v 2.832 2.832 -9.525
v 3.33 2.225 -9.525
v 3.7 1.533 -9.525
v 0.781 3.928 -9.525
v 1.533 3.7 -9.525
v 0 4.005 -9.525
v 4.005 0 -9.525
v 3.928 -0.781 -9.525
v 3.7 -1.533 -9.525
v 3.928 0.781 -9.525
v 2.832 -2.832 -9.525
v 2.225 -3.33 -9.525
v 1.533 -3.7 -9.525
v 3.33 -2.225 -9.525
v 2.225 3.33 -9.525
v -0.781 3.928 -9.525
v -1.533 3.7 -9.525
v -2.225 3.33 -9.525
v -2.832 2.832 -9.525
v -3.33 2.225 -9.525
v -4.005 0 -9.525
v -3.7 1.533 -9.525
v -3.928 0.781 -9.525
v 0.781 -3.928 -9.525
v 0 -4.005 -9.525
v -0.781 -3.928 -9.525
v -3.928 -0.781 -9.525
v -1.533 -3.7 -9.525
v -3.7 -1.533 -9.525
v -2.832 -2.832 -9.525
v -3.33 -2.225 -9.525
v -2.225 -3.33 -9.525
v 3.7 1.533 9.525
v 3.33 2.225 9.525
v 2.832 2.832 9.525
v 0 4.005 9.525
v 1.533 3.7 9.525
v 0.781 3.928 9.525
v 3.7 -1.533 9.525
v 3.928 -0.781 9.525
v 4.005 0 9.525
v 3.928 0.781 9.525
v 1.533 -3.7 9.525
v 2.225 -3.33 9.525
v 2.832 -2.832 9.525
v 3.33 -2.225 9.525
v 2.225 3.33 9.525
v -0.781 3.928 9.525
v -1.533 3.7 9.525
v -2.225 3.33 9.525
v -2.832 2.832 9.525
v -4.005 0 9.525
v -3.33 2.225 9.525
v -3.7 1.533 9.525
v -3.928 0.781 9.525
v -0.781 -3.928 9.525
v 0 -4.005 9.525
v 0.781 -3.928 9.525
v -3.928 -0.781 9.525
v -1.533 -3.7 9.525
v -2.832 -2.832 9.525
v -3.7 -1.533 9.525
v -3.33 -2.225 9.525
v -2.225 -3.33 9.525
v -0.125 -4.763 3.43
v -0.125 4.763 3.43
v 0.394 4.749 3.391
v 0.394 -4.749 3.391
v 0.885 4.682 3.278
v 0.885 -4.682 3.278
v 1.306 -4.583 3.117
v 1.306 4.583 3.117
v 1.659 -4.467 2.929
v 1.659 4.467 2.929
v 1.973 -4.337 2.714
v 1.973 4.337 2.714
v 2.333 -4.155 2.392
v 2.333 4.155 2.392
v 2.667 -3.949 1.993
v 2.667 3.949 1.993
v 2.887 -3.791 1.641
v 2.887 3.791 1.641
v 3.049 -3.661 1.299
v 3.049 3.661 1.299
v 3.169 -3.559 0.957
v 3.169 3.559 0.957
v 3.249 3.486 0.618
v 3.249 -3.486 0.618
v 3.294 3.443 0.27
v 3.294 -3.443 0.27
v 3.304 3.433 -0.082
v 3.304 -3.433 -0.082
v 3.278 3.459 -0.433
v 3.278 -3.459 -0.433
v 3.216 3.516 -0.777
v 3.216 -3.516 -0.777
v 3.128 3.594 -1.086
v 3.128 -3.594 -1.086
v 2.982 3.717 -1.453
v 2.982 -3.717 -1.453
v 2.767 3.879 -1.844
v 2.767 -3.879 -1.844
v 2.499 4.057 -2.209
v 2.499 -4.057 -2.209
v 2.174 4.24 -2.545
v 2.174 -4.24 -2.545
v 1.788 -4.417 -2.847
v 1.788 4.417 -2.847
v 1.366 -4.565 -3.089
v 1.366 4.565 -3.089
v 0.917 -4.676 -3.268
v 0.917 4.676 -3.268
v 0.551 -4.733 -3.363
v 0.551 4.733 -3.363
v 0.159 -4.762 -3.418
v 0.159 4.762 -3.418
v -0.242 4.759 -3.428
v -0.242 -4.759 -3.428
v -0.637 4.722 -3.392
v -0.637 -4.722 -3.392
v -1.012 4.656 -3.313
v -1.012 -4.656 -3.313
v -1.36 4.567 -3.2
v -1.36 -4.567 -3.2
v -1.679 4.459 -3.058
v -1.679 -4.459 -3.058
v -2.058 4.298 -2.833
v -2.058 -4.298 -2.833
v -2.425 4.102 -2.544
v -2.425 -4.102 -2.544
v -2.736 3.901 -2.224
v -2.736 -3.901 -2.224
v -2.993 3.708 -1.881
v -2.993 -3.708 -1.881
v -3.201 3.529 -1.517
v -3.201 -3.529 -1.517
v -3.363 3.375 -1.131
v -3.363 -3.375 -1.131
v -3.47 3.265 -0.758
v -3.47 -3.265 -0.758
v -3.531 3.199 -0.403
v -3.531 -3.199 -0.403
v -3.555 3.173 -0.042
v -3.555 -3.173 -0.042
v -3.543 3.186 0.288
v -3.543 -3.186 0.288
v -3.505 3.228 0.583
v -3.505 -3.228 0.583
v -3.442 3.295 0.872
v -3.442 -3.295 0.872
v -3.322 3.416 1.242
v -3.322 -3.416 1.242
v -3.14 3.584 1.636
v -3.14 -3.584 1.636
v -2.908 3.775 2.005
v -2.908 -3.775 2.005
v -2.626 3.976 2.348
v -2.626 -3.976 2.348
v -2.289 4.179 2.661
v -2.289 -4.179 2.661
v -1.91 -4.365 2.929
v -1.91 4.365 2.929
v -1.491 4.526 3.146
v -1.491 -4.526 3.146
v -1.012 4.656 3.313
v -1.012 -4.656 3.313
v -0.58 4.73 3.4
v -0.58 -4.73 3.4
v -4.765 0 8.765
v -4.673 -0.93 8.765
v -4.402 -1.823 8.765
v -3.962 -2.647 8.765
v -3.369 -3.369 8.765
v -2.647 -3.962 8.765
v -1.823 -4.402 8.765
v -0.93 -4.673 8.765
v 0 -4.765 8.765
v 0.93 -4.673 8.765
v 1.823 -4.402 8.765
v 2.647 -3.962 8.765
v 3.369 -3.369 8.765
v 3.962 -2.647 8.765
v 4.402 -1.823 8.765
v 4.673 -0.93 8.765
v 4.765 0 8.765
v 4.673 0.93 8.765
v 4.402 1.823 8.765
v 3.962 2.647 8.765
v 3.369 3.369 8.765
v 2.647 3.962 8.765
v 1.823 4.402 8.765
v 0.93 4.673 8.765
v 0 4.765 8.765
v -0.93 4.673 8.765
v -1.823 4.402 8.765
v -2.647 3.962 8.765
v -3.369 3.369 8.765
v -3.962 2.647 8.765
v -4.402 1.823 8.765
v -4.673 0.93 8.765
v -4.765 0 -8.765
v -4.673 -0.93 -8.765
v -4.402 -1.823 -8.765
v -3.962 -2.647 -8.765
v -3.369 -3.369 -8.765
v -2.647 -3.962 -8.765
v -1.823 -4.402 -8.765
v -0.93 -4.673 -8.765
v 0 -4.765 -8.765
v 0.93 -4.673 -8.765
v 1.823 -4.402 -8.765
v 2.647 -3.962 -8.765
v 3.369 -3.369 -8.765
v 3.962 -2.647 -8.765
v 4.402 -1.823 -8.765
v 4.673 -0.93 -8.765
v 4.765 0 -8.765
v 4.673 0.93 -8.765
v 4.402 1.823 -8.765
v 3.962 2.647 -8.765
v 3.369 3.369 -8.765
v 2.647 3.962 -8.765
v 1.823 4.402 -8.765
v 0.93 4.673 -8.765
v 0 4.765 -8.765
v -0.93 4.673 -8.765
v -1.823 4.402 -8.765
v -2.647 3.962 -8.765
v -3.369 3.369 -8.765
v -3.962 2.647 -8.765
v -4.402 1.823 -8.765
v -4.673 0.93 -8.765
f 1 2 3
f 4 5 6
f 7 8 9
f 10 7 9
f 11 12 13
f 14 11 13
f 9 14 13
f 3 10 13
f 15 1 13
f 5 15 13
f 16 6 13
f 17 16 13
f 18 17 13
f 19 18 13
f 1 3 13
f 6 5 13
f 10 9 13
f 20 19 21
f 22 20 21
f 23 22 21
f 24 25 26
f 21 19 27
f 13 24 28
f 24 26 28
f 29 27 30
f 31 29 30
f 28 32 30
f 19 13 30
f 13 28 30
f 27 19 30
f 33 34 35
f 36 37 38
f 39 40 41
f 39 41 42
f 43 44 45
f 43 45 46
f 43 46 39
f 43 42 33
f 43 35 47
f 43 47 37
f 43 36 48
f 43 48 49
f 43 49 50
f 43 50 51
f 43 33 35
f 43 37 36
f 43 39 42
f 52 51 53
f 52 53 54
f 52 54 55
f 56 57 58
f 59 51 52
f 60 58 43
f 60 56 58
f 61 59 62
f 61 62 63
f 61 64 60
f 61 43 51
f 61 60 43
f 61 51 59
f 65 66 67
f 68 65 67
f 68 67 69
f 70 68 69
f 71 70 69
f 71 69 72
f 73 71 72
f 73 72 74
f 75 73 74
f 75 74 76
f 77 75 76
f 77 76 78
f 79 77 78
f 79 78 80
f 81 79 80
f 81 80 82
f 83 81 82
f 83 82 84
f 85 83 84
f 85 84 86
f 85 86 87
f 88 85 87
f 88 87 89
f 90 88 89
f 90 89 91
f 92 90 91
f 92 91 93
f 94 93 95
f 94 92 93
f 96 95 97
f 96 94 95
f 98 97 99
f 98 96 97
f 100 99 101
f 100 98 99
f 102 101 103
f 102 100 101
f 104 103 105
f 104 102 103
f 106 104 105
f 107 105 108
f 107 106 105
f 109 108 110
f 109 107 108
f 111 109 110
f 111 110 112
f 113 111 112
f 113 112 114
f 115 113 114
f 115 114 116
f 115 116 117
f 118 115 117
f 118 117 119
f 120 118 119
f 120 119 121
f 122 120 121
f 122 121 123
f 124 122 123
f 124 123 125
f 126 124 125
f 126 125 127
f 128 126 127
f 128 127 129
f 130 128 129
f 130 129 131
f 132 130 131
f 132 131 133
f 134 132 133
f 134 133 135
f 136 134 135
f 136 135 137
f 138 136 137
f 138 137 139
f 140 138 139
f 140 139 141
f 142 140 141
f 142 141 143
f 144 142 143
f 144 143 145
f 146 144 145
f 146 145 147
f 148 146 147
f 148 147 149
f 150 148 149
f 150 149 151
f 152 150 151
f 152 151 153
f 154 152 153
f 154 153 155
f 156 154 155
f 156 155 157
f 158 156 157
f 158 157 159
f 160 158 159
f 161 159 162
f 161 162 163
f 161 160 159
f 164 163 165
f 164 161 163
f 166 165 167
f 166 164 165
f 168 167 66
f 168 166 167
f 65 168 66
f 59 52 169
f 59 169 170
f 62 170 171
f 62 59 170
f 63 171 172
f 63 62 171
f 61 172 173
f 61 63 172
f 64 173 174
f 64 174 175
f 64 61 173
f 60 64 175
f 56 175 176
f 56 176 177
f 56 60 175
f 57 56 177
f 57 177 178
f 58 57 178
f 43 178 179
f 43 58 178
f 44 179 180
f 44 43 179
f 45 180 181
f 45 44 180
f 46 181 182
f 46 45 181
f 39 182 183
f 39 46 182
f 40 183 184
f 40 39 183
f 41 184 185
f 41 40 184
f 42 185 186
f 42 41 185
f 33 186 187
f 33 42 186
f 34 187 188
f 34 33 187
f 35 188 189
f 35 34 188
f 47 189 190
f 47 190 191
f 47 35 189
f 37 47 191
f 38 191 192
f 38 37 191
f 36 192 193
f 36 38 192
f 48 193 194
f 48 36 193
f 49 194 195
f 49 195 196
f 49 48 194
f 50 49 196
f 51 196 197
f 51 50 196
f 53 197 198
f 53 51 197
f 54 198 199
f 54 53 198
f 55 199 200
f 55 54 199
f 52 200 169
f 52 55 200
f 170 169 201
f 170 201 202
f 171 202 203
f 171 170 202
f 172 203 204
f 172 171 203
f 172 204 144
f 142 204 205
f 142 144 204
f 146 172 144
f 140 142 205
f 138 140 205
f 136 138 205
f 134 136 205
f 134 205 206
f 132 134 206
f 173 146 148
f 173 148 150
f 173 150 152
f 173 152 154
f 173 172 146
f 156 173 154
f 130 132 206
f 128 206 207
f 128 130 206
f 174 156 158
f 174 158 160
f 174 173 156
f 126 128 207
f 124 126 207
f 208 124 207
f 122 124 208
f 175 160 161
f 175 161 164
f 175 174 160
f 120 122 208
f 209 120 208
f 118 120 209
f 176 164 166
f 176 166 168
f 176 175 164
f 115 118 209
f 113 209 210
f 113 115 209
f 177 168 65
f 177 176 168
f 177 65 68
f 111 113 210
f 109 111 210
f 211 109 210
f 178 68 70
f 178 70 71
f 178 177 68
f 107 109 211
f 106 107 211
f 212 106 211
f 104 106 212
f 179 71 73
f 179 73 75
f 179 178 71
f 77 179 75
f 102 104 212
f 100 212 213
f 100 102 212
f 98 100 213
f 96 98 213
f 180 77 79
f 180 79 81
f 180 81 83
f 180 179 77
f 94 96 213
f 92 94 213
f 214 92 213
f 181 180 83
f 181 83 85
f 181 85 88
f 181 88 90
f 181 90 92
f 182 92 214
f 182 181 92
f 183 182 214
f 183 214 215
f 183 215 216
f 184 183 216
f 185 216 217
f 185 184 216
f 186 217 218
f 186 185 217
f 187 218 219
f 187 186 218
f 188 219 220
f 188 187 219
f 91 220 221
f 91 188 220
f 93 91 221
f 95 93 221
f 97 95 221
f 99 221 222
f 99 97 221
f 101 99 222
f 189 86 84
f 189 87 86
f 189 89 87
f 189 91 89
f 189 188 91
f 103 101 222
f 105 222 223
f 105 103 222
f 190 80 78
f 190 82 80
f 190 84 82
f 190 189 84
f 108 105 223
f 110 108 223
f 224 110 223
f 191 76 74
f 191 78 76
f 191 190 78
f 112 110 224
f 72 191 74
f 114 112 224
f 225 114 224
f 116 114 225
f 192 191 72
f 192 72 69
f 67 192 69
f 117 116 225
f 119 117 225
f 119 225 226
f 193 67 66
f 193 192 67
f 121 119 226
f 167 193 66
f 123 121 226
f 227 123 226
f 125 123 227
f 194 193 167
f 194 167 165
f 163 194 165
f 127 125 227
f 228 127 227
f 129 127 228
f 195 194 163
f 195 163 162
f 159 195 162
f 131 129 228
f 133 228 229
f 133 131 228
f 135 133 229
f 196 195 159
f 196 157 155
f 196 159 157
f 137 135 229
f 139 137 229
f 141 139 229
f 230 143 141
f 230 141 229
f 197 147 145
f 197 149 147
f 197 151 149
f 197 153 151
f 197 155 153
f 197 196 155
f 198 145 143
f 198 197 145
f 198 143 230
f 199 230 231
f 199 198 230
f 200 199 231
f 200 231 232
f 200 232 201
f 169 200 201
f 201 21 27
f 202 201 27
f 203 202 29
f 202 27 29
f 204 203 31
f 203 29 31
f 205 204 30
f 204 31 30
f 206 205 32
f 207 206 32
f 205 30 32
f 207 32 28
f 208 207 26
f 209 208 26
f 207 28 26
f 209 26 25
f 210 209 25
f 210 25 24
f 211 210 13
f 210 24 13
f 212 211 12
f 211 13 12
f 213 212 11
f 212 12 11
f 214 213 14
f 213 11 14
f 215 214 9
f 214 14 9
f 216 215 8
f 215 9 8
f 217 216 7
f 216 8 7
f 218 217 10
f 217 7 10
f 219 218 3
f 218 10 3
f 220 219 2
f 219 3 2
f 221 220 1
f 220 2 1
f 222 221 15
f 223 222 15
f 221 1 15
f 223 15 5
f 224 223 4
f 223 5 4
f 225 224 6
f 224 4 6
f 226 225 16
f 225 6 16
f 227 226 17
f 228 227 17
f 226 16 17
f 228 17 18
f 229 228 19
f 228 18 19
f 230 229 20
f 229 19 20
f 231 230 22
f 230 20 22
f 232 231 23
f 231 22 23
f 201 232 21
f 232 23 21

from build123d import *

# Parameters (mm, degrees)
SKETCH1_R               = 4.765
BOSS_EXTRUDE1_DEPTH     = 9.525
CUT_EXTRUDE1_DEPTH      = 12.667736499
CUT_EXTRUDE1_DEPTH_BACK = 12.667736499
SKETCH2_R               = 3.43
CHAMFER1_SIZE           = 0.76


with BuildPart() as part:
    # Sketch1 → Boss-Extrude1 (new, symmetric)
    with BuildSketch(Plane.XY):
        with Locations(Location((0, 0, 0), (0, 0, 180))):
            Circle(SKETCH1_R)
    extrude(amount=BOSS_EXTRUDE1_DEPTH, both=True)

    # Sketch2 → Cut-Extrude1 (cut, two sides: drawn at the far end of the back side and taken through both)
    with BuildSketch(Plane(origin=(0, 0, 0), x_dir=(1, 0, 0), z_dir=(0, 1, 0)).offset(-CUT_EXTRUDE1_DEPTH_BACK)):
        with Locations(Location((-0.125, 0, 0), (0, 0, 270))):
            Circle(SKETCH2_R)
    extrude(amount=CUT_EXTRUDE1_DEPTH + CUT_EXTRUDE1_DEPTH_BACK, mode=Mode.SUBTRACT)

    # Chamfer1
    chamfer1_edges = [part.edges().sort_by_distance(p)[0] for p in [
        (4.765, 0, -9.525),
        (4.765, 0, 9.525),
    ]]
    chamfer(chamfer1_edges, length=CHAMFER1_SIZE)


solid = part.part
